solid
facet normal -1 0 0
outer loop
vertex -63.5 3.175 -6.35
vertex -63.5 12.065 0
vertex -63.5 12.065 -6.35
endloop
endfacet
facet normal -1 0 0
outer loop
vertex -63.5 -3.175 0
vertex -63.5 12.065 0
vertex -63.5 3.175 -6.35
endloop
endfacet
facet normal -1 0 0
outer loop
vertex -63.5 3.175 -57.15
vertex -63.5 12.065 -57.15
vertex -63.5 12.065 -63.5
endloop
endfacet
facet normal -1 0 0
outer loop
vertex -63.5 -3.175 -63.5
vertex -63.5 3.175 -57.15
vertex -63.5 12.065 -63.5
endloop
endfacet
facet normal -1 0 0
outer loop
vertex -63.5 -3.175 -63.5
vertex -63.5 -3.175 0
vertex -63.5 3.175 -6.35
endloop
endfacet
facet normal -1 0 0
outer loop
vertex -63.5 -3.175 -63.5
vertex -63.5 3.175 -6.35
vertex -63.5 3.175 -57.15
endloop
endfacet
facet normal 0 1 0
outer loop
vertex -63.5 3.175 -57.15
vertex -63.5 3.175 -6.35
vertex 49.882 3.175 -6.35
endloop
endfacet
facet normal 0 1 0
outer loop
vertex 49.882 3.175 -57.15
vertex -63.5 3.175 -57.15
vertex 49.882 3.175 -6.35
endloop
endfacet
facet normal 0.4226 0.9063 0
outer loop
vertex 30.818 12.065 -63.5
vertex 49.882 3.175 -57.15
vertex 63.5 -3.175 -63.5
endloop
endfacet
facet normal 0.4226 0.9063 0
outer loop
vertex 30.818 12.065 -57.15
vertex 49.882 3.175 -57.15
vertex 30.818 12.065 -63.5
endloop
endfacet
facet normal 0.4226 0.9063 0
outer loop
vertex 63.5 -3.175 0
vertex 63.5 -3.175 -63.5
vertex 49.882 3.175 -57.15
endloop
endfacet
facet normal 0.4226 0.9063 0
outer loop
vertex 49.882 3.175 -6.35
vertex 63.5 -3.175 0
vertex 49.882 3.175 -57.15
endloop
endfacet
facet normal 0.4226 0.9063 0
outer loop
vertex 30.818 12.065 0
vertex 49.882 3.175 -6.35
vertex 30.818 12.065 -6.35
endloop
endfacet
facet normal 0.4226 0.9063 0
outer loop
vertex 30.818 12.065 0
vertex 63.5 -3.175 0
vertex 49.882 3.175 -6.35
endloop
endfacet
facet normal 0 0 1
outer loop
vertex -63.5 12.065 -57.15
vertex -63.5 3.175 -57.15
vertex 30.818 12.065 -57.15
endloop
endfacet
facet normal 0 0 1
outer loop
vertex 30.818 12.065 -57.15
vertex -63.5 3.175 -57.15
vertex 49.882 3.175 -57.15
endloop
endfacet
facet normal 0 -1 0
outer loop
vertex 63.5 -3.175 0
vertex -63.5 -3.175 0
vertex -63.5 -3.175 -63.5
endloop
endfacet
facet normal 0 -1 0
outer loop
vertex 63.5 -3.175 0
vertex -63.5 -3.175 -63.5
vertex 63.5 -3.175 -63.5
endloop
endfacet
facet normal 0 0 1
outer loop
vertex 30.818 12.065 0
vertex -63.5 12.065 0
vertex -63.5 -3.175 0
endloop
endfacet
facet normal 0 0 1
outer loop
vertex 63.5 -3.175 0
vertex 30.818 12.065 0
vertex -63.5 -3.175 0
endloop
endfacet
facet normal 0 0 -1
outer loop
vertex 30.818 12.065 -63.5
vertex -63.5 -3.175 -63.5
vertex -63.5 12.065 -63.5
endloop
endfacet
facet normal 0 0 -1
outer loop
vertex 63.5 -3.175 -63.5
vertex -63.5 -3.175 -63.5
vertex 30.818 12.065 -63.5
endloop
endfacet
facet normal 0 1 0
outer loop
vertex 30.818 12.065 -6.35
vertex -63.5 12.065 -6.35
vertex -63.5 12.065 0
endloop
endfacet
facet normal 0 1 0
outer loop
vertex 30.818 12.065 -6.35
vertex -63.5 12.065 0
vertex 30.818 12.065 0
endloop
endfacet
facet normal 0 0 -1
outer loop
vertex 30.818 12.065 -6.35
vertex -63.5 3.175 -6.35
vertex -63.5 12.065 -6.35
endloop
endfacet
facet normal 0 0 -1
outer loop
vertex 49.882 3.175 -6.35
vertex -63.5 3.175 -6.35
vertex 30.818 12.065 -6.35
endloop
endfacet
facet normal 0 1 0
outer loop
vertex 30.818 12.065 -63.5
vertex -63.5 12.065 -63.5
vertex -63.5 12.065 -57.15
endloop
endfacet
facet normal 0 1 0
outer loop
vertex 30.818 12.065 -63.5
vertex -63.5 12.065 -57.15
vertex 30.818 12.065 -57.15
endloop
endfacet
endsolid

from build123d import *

# Parameters (mm, degrees)
SKETCH1_W           = 127
SKETCH1_H           = 6.35
BOSS_EXTRUDE1_DEPTH = 63.5
SKETCH2_W           = 127
SKETCH2_H           = 6.35
BOSS_EXTRUDE2_DEPTH = 8.89
CUT_EXTRUDE1_DEPTH  = 64.5


with BuildPart() as part:
    # Sketch1 → Boss-Extrude1 (new body)
    with BuildSketch(Plane.XY):
        Rectangle(SKETCH1_W, SKETCH1_H)
    extrude(amount=-BOSS_EXTRUDE1_DEPTH)

    # Sketch2 → Boss-Extrude2 (add)
    with BuildSketch(Plane(origin=(0, 3.175, 0), x_dir=(1, 0, 0), z_dir=(0, 1, 0))):
        with Locations((0, 60.325)):
            Rectangle(SKETCH2_W, SKETCH2_H)
        with Locations((0, 3.175)):
            Rectangle(SKETCH2_W, SKETCH2_H)
    extrude(amount=BOSS_EXTRUDE2_DEPTH)

    # Sketch3 → Cut-Extrude1 (cut, through all)
    with BuildSketch(Plane.XY):
        Polygon((63.5, -3.175), (30.817714531, 12.065), (41.55221838, 35.085217791), (74.234503848, 19.845217791), align=None)
    extrude(amount=-CUT_EXTRUDE1_DEPTH, mode=Mode.SUBTRACT)


solid = part.part
